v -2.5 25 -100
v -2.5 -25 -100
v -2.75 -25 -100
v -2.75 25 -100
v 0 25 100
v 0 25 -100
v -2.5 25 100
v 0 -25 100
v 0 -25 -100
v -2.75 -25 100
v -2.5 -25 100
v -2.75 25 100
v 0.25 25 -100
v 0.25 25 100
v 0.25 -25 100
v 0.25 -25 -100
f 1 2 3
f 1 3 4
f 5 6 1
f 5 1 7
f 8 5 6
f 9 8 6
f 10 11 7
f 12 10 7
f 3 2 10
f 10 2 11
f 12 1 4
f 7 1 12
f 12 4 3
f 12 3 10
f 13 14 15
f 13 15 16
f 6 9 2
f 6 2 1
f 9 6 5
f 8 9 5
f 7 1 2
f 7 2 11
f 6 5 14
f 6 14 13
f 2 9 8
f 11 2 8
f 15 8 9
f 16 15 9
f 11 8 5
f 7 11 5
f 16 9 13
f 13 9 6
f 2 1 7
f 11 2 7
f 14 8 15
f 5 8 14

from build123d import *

# Parameters (mm, degrees)
SKETCH1_W           = 200
SKETCH1_H           = 50
BOSS_EXTRUDE1_DEPTH = 0.25
SKETCH2_W           = 200
SKETCH2_H           = 50
BOSS_EXTRUDE2_DEPTH = 2.5
SKETCH3_W           = 200
SKETCH3_H           = 50
BOSS_EXTRUDE3_DEPTH = 0.25


with BuildPart() as part:
    # Sketch1 → Boss-Extrude1 (new body)
    with BuildSketch(Plane(origin=(0, 0, 0), x_dir=(0, 0, -1), z_dir=(1, 0, 0))):
        Rectangle(SKETCH1_W, SKETCH1_H)
    extrude(amount=BOSS_EXTRUDE1_DEPTH)


with BuildPart() as body_2:
    # Sketch2 → Boss-Extrude2 (new body)
    with BuildSketch(Plane.ZY):
        Rectangle(SKETCH2_W, SKETCH2_H)
    extrude(amount=BOSS_EXTRUDE2_DEPTH)


with BuildPart() as body_3:
    # Sketch3 → Boss-Extrude3 (new body)
    with BuildSketch(Plane.ZY.offset(2.5)):
        Rectangle(SKETCH3_W, SKETCH3_H)
    extrude(amount=BOSS_EXTRUDE3_DEPTH)


solid = Compound([part.part, body_2.part, body_3.part])
